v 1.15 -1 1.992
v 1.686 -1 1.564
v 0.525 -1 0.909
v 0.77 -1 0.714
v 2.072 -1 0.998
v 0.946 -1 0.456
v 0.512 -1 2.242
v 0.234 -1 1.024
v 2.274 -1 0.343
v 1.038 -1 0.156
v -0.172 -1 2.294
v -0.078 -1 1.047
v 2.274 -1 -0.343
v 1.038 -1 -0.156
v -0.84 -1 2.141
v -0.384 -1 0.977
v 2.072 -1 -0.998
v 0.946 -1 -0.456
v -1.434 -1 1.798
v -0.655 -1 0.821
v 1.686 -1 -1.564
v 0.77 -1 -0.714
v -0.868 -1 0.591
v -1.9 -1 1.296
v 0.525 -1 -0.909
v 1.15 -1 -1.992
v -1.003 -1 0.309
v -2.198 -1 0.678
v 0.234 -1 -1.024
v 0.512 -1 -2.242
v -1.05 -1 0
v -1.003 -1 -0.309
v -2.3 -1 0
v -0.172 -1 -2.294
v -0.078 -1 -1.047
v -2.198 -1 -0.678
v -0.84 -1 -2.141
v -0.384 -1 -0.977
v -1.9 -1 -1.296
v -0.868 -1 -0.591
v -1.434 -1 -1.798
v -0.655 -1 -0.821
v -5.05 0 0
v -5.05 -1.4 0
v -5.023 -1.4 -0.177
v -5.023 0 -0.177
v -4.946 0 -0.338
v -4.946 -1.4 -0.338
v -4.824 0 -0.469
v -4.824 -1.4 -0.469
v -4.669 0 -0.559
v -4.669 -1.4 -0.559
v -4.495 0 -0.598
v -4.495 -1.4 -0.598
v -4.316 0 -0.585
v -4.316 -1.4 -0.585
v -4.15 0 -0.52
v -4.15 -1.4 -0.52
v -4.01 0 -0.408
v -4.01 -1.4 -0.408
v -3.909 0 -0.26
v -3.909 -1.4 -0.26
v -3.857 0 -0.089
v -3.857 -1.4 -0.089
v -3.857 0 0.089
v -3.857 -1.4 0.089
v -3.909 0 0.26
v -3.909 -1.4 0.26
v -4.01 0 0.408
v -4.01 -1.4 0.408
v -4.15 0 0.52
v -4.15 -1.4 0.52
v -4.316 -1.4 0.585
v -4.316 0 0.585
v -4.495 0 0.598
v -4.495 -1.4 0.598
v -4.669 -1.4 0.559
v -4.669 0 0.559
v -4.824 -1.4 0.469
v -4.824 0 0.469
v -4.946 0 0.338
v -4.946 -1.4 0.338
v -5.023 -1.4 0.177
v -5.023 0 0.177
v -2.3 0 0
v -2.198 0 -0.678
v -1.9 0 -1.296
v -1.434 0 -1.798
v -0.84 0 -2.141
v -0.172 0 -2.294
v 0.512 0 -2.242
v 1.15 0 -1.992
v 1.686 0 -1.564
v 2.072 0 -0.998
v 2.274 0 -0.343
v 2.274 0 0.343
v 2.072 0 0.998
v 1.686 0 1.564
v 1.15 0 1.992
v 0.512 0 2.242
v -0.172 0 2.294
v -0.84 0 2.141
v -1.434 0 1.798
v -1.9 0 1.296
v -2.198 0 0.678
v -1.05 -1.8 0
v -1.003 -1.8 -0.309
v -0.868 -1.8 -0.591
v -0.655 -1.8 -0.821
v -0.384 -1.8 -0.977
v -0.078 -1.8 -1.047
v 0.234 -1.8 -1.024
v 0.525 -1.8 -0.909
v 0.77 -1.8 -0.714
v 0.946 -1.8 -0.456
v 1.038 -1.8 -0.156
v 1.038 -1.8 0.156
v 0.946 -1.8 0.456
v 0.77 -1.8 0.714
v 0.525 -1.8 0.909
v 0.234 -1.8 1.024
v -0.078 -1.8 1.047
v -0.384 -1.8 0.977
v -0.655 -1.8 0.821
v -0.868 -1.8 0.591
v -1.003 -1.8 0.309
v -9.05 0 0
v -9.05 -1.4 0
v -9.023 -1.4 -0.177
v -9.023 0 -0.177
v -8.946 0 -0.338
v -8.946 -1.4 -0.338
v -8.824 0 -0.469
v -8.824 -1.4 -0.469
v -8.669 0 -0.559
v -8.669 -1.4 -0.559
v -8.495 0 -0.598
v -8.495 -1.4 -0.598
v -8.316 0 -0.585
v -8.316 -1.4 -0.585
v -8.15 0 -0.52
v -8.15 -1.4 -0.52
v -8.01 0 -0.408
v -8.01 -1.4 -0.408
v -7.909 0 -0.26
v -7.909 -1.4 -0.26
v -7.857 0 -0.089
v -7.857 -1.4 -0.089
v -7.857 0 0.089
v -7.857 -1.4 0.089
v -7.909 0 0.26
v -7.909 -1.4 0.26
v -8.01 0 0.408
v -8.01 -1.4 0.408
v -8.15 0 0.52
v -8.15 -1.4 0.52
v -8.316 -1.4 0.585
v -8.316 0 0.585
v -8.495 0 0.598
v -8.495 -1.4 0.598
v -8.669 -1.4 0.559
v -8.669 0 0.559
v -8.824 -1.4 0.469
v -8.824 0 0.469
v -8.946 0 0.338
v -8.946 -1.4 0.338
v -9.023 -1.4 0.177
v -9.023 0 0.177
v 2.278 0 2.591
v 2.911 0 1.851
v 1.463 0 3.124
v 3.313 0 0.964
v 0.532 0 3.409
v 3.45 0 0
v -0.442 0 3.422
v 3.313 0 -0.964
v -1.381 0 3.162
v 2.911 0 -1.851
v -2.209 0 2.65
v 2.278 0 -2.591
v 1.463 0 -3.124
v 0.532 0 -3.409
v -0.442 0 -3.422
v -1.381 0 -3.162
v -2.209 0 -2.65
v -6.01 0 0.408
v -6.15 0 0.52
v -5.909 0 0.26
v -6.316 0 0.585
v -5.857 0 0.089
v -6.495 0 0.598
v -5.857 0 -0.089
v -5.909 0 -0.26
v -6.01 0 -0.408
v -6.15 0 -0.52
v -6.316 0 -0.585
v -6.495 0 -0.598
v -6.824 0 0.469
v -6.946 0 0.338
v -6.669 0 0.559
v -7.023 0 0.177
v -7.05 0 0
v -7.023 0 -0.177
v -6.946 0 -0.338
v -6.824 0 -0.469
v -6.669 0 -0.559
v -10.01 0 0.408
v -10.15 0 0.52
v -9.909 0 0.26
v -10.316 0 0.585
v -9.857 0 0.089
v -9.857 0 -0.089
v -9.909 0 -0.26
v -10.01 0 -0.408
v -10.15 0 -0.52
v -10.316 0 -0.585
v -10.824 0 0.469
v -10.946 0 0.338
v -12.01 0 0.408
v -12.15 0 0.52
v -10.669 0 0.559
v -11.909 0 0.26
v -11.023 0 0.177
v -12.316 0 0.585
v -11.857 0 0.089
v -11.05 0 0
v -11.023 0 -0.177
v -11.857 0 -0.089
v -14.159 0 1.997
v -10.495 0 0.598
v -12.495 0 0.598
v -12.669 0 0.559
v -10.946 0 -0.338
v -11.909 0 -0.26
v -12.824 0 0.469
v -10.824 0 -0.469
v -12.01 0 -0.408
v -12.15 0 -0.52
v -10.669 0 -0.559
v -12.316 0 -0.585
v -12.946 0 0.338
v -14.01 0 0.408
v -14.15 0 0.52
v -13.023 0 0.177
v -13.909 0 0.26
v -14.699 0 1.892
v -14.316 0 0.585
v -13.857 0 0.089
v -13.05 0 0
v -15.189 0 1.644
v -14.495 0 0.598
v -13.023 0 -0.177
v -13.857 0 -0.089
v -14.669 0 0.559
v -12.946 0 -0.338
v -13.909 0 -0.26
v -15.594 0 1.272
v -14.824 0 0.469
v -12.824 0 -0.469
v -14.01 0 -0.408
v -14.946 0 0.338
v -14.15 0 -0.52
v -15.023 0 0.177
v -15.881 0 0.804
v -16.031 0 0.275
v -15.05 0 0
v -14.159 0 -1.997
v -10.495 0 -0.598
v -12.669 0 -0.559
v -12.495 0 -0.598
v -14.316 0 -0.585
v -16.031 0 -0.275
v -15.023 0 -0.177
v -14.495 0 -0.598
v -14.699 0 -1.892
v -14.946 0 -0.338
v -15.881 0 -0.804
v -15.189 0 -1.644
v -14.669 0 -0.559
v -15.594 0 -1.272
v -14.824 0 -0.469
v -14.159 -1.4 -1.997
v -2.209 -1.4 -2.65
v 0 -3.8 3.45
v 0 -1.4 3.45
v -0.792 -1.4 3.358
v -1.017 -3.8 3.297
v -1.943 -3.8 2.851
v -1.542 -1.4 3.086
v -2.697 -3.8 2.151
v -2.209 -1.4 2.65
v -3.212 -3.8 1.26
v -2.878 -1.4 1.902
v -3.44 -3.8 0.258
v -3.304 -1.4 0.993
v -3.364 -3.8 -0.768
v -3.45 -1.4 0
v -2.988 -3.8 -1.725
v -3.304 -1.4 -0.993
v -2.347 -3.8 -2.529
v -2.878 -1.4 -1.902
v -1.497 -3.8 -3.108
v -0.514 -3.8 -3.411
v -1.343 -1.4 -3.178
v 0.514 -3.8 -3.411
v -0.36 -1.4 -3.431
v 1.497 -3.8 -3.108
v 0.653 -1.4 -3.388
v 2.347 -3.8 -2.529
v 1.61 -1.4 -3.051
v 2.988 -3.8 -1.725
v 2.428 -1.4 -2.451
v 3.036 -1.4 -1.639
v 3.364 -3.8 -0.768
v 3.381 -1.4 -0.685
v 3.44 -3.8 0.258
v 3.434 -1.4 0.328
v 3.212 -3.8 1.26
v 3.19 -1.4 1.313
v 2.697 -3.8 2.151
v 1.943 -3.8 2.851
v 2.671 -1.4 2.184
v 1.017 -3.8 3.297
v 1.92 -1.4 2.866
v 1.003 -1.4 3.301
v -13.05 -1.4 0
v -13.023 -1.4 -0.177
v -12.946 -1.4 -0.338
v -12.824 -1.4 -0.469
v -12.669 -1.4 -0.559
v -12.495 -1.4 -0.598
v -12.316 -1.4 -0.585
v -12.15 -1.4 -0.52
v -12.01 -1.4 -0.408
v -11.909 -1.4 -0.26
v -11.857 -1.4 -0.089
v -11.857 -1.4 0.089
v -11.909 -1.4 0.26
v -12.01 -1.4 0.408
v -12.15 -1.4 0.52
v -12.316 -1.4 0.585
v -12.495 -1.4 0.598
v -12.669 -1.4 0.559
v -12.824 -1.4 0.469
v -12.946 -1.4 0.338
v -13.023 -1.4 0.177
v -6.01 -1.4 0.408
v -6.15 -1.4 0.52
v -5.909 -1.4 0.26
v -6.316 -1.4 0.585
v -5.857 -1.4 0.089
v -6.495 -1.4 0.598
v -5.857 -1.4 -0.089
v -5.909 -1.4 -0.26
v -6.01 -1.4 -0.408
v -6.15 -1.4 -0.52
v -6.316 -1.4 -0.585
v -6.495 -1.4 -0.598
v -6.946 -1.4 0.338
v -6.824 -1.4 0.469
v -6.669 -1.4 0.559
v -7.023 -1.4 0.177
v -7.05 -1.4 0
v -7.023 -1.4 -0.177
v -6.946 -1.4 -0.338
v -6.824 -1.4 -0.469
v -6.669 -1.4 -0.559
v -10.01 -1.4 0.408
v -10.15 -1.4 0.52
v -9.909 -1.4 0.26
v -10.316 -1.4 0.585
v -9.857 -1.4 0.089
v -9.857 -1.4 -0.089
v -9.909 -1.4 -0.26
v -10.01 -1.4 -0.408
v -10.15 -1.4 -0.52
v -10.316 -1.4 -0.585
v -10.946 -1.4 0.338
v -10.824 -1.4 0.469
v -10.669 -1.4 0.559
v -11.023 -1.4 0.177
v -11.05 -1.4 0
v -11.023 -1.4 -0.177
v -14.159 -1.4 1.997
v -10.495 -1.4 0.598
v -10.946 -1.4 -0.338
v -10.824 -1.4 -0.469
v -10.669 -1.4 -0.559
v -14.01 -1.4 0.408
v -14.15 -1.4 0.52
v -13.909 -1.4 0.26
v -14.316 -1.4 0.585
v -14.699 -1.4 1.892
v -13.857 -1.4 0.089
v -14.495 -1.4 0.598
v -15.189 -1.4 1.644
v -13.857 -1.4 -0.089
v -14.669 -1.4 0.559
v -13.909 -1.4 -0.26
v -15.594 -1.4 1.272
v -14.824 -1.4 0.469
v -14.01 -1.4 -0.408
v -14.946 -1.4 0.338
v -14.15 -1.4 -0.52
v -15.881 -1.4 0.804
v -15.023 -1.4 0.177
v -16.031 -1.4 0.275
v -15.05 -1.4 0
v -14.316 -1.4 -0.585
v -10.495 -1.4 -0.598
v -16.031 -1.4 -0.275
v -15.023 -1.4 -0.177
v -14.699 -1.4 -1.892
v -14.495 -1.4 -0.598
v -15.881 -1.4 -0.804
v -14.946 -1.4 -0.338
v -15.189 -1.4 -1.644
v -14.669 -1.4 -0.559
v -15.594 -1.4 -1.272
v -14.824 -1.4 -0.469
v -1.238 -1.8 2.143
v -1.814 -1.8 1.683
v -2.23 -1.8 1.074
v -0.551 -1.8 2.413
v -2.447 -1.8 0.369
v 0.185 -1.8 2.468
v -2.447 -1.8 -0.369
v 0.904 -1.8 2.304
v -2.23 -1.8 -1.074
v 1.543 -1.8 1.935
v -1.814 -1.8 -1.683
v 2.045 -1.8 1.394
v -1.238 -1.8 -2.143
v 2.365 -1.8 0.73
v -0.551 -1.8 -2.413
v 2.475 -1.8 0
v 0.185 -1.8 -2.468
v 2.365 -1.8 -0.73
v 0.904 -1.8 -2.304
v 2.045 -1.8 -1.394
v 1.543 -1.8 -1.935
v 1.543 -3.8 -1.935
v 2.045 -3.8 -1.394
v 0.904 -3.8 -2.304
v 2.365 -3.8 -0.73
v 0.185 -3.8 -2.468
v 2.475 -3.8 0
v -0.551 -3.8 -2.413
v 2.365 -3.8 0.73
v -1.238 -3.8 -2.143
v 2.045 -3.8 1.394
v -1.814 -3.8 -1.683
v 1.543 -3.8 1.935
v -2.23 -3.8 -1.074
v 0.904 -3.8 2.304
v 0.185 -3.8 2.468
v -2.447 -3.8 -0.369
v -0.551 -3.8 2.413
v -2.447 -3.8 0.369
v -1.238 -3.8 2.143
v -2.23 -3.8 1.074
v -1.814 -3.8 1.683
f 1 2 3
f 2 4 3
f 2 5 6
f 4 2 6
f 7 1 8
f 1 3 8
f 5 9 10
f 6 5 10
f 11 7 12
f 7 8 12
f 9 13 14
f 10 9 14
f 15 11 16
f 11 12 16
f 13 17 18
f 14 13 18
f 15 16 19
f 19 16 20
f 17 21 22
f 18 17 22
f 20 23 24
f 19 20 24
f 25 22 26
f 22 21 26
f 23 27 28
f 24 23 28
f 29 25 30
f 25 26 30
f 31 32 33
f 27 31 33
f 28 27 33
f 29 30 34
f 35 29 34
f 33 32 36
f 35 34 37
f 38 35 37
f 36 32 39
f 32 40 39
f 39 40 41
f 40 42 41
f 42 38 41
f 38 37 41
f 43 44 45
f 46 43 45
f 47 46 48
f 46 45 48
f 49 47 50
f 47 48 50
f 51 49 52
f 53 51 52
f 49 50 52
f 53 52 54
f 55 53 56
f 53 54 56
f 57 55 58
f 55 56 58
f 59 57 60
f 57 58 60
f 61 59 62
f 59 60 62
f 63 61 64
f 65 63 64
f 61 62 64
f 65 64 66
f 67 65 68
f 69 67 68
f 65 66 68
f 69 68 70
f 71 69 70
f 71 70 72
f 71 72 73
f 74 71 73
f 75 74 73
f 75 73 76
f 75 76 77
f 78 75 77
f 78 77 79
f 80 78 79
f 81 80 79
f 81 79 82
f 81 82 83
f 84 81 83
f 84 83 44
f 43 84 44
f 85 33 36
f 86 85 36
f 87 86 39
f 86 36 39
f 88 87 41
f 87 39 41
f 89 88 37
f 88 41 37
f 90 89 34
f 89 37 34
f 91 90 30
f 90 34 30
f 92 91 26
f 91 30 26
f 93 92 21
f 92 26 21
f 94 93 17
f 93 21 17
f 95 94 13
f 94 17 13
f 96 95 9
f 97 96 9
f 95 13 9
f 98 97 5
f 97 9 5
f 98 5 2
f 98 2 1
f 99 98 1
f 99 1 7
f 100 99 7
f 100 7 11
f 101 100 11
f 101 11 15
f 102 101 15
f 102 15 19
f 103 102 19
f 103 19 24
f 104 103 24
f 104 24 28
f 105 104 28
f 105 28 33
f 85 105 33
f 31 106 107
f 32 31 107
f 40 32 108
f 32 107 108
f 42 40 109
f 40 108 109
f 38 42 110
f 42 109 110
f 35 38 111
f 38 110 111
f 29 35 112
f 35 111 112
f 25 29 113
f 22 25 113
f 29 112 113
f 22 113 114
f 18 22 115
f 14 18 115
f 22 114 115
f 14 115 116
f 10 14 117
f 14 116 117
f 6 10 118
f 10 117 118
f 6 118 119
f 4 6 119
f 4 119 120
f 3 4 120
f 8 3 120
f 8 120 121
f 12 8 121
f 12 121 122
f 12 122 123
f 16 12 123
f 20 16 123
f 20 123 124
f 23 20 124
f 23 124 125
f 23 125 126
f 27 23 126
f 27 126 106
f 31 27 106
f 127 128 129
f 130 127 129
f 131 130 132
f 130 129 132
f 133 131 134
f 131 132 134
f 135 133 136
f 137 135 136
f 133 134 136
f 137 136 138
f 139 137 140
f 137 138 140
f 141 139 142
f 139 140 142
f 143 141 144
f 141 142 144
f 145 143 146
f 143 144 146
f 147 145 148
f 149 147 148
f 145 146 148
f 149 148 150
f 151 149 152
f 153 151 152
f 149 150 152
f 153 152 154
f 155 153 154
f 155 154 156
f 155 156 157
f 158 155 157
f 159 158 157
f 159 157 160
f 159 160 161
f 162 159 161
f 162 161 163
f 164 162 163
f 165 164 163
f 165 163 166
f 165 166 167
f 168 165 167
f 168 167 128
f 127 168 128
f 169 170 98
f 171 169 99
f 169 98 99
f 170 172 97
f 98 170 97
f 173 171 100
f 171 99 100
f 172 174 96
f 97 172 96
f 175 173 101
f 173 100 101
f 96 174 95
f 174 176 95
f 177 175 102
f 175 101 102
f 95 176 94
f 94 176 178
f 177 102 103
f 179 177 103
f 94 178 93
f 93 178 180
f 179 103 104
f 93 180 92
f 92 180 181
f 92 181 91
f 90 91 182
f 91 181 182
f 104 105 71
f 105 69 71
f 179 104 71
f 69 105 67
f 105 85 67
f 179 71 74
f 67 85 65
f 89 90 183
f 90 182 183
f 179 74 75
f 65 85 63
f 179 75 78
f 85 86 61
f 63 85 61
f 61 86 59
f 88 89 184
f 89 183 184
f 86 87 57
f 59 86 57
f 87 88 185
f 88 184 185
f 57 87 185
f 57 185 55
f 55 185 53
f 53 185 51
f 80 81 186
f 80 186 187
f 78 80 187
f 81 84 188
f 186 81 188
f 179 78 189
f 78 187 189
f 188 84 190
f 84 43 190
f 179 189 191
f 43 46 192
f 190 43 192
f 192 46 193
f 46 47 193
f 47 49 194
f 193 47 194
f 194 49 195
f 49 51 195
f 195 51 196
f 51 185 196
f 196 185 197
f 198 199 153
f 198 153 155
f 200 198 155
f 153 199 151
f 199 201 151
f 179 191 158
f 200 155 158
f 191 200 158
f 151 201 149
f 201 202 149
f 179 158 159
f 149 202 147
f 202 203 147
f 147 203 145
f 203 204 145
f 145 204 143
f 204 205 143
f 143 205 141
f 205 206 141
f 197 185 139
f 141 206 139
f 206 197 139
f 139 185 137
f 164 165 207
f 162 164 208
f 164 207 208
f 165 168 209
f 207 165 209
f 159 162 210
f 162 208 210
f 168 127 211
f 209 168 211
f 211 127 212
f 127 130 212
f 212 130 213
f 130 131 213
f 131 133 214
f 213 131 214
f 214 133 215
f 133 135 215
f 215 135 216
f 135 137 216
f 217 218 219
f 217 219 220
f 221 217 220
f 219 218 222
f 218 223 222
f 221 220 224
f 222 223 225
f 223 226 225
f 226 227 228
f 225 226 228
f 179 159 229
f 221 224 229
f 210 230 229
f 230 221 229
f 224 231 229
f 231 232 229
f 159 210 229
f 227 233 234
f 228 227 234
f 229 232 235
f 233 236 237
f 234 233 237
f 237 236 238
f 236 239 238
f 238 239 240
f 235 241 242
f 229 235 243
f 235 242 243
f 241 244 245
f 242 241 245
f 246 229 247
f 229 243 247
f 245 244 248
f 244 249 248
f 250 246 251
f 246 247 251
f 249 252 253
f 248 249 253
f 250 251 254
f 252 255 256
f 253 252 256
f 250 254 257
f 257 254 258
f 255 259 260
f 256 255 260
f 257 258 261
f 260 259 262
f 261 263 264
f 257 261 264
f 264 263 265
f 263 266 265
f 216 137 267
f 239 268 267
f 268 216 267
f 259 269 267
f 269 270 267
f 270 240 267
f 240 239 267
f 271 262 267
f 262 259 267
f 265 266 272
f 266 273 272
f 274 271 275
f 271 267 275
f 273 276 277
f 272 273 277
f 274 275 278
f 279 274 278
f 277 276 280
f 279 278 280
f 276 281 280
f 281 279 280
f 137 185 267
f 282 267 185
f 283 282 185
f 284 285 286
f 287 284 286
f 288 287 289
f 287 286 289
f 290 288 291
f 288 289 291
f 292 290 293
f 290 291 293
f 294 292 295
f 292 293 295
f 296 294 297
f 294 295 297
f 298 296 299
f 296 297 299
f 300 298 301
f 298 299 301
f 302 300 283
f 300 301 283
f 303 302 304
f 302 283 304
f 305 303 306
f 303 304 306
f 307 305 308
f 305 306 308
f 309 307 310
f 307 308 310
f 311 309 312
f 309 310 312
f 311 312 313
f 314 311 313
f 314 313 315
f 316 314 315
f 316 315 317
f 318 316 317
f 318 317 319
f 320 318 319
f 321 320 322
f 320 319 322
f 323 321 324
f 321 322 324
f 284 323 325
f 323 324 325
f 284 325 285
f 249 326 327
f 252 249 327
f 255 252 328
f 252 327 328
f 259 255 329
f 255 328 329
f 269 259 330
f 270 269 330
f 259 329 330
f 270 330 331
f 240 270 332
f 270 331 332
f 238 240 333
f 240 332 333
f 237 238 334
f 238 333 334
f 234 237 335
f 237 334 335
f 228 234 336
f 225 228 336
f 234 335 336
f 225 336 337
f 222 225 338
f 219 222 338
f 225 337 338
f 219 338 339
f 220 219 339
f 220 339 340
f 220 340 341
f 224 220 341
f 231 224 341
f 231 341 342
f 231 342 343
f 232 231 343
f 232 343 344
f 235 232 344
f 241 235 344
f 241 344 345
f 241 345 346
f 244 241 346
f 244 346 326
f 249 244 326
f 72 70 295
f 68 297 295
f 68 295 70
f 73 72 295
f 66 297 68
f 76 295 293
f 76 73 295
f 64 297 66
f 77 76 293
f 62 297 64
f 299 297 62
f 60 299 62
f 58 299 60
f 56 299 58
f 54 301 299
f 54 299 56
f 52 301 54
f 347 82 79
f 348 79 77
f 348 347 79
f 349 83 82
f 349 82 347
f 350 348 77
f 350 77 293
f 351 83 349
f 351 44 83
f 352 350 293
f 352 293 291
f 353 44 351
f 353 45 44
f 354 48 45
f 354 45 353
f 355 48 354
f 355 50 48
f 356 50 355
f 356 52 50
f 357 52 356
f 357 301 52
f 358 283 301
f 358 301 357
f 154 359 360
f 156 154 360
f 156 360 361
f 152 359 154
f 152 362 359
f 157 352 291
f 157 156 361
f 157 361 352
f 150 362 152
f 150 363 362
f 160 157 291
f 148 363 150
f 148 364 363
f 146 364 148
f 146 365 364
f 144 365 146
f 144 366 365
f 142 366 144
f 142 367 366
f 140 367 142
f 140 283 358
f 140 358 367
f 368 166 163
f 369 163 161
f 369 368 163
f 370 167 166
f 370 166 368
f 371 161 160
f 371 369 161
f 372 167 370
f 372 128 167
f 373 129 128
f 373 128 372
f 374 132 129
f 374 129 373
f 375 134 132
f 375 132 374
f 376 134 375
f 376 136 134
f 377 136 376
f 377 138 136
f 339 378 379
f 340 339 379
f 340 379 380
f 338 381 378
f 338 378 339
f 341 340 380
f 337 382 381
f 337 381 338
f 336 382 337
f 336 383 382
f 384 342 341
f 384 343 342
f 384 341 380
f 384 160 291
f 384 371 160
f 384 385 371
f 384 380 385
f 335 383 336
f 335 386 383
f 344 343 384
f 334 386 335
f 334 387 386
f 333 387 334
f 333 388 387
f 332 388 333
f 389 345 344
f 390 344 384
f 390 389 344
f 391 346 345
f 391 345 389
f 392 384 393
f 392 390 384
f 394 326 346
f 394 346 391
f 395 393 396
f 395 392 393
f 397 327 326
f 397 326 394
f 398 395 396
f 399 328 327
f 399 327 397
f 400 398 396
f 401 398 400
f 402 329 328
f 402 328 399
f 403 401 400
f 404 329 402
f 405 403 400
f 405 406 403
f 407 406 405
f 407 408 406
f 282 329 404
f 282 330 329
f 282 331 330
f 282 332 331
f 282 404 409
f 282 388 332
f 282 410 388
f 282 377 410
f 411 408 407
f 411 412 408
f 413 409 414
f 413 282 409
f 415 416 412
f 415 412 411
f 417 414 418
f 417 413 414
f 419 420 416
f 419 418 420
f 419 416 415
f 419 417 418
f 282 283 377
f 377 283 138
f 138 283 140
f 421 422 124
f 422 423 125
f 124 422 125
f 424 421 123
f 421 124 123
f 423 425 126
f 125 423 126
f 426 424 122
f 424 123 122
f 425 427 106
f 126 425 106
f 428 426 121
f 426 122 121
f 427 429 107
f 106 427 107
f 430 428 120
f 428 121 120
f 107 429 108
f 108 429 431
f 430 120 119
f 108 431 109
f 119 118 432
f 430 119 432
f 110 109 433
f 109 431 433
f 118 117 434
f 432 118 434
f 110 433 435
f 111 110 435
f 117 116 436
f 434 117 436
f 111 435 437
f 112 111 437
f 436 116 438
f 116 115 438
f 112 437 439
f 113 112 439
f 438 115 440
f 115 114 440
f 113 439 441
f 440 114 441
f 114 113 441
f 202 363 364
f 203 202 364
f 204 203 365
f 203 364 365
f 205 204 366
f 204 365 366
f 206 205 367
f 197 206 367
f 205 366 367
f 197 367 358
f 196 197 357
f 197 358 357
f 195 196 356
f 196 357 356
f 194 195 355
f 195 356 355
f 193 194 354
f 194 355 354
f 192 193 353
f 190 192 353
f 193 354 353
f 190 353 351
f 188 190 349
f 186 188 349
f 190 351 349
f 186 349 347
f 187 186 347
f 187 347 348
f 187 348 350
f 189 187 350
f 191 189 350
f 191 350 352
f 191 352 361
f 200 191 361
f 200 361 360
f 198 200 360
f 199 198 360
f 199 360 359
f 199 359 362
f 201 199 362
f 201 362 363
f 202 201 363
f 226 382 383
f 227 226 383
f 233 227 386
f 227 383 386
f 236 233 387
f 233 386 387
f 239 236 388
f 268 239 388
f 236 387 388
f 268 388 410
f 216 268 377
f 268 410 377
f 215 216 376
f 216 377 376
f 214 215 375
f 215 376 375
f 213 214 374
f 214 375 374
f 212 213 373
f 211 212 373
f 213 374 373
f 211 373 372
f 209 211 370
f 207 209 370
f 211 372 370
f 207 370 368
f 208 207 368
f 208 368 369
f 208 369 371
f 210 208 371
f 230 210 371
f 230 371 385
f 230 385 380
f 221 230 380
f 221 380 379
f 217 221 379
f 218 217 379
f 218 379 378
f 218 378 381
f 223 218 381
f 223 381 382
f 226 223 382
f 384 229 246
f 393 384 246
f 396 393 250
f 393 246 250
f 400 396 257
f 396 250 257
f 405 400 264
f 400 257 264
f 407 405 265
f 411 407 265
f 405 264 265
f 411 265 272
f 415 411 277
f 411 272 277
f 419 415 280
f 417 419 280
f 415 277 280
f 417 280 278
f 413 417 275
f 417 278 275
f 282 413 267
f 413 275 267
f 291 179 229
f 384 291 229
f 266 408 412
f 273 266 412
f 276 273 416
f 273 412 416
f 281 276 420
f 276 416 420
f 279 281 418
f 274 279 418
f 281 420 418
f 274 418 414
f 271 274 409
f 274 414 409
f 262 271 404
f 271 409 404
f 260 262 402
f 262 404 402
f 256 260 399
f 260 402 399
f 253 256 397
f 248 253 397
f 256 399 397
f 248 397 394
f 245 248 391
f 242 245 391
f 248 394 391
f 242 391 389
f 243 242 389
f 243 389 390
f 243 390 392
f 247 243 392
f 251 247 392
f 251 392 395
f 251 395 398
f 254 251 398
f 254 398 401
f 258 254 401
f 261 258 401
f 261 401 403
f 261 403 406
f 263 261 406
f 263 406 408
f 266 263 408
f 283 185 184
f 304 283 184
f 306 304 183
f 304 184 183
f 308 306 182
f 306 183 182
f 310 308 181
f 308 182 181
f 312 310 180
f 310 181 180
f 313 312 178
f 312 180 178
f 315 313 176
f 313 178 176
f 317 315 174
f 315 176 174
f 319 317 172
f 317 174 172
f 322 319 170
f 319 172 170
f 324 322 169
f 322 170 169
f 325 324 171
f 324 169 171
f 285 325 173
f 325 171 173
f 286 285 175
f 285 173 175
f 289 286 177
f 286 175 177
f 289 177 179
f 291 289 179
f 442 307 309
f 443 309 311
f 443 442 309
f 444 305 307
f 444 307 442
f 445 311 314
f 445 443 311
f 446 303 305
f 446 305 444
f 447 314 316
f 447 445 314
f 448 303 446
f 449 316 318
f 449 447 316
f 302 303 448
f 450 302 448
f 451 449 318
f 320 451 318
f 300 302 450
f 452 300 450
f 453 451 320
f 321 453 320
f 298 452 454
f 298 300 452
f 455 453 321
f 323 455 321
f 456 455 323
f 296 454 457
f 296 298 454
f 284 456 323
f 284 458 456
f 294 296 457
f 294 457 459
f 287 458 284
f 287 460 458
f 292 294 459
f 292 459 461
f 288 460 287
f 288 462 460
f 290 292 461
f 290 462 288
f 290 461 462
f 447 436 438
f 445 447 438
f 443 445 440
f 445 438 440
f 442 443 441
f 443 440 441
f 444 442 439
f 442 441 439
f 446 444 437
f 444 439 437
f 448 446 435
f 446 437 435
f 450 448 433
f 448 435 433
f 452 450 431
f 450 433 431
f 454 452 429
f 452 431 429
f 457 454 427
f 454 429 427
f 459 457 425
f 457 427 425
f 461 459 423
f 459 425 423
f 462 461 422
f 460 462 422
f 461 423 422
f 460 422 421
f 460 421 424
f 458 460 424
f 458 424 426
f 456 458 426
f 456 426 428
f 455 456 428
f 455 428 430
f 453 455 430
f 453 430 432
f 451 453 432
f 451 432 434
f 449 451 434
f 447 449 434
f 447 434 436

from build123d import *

# Parameters (mm, degrees)
RESSALTO_EXTRUS_O1_DEPTH = 1.4
ESBO_O2_R                = 3.45
RESSALTO_EXTRUS_O2_DEPTH = 2.4
FURO4_D                  = 1.2
PADR_O_LINEAR1_COUNT     = 6
PADR_O_LINEAR1_PITCH     = 2
FURO1_D                  = 4.95
FURO1_DEPTH              = 2
FURO2_D                  = 4.6
FURO2_DEPTH              = 1
FURO3_D                  = 2.1


with BuildPart() as part:
    # Esboço1 → Ressalto-extrusão1 (new body)
    with BuildSketch(Plane(origin=(0, 0, 0), x_dir=(1, 0, 0), z_dir=(0, 1, 0))):
        with BuildLine():
            Line((-14.159121967, 1.99702088), (-2.209072203, 2.65))
            ThreePointArc((-2.209072203, 2.65), (3.45, 0), (-2.209072203, -2.65))
            Line((-2.209072203, -2.65), (-14.159121967, -1.99702088))
            ThreePointArc((-14.159121967, -1.99702088), (-16.05, 0), (-14.159121967, 1.99702088))
        make_face()
    extrude(amount=-RESSALTO_EXTRUS_O1_DEPTH)

    # Esboço2 → Ressalto-extrusão2 (add)
    with BuildSketch(Plane.XZ.offset(1.4)):
        with Locations(Location((0, 0, 0), (0, 0, 90))):
            Circle(ESBO_O2_R)
    extrude(amount=RESSALTO_EXTRUS_O2_DEPTH)

    # Furo4 (through all)
    with Locations(Plane(origin=(0, 0, 0), x_dir=(1, 0, 0), z_dir=(0, 1, 0))):
        with Locations((-14.45, 0)):
            furo4 = Hole(FURO4_D / 2)

    # Padrão linear1: Furo4 ×6
    with Locations(*[(i * PADR_O_LINEAR1_PITCH, 0, 0) for i in range(1, PADR_O_LINEAR1_COUNT)]):
        add(furo4, mode=Mode.SUBTRACT)

    # Furo1
    with Locations(Plane(origin=(0, -3.8, 0), x_dir=(-1, 0, 0), z_dir=(0, -1, 0))):
        with Locations((0, 0)):
            Hole(FURO1_D / 2, depth=FURO1_DEPTH)

    # Furo2
    with Locations(Plane(origin=(0, 0, 0), x_dir=(1, 0, 0), z_dir=(0, 1, 0))):
        with Locations((0, 0)):
            Hole(FURO2_D / 2, depth=FURO2_DEPTH)

    # Furo3 (through all)
    with Locations(Plane(origin=(0, 0, 0), x_dir=(1, 0, 0), z_dir=(0, 1, 0))):
        with Locations((0, 0)):
            Hole(FURO3_D / 2)


solid = part.part
